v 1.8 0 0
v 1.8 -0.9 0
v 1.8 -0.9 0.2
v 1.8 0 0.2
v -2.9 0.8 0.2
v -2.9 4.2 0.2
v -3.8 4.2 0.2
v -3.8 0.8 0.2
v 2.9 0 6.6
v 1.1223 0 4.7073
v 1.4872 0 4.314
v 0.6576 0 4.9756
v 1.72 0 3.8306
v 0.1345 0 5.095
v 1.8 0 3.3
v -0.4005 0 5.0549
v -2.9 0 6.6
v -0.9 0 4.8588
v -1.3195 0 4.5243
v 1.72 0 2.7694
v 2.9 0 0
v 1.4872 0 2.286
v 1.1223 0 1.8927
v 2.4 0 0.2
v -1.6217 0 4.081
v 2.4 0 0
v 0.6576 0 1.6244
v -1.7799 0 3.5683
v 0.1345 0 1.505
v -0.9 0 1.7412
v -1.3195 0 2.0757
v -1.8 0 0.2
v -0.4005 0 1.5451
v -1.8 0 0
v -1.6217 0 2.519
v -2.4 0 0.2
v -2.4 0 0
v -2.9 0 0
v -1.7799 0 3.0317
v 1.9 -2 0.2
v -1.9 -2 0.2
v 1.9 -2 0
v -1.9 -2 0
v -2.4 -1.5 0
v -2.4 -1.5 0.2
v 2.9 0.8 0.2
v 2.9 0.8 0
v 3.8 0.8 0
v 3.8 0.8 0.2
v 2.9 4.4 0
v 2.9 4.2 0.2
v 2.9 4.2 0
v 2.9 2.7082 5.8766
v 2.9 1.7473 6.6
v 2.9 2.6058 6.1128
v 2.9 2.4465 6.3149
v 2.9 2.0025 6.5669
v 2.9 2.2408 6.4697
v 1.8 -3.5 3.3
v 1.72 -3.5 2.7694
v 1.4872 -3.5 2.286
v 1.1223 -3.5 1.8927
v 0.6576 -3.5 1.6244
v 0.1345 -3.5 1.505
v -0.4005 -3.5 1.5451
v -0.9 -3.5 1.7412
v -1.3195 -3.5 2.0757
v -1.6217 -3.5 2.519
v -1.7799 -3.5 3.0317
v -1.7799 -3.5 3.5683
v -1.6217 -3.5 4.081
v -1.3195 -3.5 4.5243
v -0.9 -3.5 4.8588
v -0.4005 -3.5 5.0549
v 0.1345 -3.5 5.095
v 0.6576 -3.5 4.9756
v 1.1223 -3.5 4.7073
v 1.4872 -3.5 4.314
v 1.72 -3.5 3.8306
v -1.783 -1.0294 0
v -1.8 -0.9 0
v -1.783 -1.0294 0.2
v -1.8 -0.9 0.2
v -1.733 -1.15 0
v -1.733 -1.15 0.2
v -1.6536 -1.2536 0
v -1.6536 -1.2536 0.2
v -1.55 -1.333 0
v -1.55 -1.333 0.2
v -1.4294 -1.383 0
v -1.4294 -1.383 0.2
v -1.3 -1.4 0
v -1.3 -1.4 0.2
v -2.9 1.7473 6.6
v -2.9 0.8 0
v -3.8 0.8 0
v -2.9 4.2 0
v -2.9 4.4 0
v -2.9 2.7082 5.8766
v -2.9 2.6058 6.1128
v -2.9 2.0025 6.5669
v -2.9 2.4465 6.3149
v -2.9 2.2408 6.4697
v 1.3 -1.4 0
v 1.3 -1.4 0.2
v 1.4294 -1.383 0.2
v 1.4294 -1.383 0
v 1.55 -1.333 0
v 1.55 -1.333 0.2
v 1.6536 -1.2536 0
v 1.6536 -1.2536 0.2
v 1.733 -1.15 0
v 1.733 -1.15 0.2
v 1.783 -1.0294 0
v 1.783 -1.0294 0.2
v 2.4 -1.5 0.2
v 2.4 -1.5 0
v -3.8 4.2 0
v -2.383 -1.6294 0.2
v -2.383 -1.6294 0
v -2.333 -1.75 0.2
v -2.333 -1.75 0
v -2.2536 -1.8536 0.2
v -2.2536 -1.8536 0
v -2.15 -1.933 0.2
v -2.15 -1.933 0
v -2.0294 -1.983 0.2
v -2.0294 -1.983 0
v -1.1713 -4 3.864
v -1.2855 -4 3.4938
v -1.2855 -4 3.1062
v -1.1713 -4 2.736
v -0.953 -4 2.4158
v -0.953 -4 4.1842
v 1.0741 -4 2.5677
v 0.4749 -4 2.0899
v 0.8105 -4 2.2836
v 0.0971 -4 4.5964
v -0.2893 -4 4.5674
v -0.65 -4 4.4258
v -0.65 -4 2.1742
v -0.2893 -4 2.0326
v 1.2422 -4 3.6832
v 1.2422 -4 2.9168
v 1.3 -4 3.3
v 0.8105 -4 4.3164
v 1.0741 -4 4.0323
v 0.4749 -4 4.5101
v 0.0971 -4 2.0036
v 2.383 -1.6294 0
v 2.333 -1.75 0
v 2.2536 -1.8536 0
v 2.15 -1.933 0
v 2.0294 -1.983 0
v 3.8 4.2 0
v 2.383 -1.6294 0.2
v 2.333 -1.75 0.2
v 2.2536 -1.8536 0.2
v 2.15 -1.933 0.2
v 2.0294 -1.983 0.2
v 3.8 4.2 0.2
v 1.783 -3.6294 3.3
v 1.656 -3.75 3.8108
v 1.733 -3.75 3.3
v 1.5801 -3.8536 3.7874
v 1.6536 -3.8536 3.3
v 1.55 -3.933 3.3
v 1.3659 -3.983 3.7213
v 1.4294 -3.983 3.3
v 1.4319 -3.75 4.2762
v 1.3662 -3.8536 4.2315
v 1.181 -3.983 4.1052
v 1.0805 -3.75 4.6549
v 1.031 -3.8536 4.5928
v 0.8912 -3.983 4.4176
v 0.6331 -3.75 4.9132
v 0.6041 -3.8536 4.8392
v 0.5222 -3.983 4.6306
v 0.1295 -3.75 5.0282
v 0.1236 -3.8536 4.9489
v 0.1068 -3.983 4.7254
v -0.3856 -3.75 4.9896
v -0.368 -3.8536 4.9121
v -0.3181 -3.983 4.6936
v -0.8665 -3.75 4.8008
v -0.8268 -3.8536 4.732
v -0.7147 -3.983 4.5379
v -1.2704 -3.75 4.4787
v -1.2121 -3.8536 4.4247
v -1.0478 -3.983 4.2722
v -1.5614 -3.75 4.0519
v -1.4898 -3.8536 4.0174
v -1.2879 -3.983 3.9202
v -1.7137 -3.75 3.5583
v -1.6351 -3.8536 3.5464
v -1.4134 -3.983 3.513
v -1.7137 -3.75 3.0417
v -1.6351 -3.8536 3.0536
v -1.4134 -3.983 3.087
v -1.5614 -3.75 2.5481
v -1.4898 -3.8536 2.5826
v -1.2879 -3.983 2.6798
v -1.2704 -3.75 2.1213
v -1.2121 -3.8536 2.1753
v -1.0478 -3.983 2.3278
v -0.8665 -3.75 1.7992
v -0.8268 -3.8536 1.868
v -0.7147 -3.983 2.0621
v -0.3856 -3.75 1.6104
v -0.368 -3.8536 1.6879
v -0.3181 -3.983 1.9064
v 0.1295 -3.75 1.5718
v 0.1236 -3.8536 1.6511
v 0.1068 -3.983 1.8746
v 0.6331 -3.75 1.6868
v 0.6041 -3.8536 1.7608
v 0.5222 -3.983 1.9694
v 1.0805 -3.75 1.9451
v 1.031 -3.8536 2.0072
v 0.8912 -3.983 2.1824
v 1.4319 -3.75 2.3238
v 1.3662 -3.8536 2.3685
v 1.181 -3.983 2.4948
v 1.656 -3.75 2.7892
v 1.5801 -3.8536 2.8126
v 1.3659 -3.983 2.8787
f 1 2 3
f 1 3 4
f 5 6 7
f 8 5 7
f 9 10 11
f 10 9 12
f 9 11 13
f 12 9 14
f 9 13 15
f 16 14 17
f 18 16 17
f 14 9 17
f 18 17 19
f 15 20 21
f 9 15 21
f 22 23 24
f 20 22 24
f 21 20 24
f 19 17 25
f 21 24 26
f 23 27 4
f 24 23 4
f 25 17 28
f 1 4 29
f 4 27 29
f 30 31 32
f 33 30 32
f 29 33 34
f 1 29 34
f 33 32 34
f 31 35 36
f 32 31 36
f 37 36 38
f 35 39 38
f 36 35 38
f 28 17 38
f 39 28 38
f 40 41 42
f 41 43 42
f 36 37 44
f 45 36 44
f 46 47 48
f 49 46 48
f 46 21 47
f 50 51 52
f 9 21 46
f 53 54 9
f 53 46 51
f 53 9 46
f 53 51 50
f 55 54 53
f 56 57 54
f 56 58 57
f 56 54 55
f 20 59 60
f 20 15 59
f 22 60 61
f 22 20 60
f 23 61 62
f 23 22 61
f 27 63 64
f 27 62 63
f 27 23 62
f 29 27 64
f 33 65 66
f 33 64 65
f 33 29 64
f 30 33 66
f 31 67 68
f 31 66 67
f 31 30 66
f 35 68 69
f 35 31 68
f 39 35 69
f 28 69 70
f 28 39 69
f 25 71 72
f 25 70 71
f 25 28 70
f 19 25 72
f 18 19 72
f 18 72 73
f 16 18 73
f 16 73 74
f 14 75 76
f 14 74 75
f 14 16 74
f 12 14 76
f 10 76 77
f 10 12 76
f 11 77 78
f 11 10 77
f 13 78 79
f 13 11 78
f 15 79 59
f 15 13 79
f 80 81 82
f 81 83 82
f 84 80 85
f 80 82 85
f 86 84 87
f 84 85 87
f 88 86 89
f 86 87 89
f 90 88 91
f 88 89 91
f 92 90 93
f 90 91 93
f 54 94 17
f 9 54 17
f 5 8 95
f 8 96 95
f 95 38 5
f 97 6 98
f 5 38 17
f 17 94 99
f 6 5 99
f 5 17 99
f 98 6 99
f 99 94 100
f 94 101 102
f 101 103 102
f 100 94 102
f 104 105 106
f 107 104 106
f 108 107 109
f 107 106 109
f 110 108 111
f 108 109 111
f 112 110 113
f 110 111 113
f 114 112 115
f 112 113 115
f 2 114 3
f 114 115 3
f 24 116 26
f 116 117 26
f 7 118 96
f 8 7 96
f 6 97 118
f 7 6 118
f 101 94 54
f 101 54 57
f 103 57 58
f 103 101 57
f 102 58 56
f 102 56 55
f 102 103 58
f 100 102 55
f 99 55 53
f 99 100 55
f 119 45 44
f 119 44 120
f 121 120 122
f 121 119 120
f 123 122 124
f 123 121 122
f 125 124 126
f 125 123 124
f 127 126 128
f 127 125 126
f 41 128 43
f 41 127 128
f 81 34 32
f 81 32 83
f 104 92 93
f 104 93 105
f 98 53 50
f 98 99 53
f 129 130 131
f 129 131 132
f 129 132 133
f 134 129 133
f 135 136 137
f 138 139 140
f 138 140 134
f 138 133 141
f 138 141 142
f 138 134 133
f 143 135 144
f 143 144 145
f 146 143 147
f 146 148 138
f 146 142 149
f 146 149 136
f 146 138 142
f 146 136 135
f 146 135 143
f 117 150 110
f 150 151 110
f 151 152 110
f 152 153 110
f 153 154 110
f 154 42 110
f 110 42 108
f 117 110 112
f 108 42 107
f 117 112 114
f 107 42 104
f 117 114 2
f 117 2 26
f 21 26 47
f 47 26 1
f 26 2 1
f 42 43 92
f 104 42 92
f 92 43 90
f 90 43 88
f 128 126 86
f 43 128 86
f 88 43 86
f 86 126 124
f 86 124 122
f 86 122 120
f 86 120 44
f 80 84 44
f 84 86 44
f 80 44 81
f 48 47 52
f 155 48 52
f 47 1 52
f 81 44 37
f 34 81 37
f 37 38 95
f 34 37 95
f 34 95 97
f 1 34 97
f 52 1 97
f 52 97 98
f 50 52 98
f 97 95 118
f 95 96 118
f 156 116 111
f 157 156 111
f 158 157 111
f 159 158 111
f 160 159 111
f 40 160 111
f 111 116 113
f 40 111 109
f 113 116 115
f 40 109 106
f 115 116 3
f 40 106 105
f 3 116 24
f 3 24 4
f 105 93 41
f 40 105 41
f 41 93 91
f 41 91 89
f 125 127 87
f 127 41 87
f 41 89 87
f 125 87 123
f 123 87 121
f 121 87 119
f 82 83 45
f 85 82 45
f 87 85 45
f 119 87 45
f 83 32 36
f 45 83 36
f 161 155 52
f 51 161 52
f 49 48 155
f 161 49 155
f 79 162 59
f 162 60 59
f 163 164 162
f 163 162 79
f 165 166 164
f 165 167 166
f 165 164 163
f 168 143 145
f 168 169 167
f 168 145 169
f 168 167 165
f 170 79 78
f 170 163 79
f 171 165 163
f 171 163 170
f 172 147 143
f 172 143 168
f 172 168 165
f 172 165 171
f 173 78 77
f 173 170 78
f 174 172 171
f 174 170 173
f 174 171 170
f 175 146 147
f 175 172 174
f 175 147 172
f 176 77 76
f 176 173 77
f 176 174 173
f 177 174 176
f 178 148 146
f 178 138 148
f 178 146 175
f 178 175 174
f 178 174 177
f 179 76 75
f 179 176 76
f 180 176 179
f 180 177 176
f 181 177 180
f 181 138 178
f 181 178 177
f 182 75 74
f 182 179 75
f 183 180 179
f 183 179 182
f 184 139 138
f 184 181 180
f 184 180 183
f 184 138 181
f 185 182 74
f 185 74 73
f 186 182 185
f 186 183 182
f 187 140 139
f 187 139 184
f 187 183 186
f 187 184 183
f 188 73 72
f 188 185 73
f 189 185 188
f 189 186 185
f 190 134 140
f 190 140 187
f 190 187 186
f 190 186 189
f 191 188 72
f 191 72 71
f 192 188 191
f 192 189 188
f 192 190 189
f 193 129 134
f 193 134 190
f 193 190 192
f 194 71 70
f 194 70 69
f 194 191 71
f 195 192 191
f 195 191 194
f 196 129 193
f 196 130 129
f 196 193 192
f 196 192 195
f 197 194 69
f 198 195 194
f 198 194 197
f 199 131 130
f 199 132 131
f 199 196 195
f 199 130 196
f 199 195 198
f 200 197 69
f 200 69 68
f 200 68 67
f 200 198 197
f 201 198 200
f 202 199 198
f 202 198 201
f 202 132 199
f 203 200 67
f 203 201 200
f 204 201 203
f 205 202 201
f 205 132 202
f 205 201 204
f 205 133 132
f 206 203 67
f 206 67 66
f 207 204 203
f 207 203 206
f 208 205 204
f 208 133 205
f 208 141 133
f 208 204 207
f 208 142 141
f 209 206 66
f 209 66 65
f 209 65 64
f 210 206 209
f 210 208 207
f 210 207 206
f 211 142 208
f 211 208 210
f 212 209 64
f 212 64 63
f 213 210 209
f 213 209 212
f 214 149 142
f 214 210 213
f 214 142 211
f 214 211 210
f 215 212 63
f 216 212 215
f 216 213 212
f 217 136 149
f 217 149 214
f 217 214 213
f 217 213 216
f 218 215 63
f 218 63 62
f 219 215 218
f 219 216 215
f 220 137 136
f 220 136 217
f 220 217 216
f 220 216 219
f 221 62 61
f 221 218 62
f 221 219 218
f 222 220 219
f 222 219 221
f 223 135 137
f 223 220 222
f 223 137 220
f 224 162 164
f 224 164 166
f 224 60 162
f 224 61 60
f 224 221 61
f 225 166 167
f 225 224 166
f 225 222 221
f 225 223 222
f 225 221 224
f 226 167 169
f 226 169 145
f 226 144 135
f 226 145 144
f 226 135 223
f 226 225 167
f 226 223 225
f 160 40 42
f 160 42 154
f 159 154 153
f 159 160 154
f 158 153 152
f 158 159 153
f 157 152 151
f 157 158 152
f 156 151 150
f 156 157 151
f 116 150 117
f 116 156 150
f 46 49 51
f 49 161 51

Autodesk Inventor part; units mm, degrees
ref_plane "YZ Plane" through (0, 0, 0) normal (1, 0, 0) x (0, 1, 0)
ref_plane "XZ Plane" through (0, 0, 0) normal (0, 1, 0) x (-1, 0, 0)
ref_plane "XY Plane" through (0, 0, 0) normal (0, 0, 1) x (1, 0, 0)
sketch "Skizze2" plane through (0, 0, 0) normal (1, 0, 0) x (0, 1, 0)
  line L0 (0, 0) -> (4.4, 0)
  line L1 (2.5, 6.6) -> (0, 6.6)
  line L2 (0, 6.6) -> (0, 0)
  line L3 (2.5, 6.6) -> (4.4, 0)
  line L4 (-0.88, 0) -> (5.28, 0) projected
  line L5 (0, 7.92) -> (0, -1.32) projected
  dimension "d2" = 6.6
  dimension "d3" = 2.5
  dimension "d4" = 4.4
extrude "Extrusion1" add sketch "Skizze2" along normal mid plane 5.8
sketch "Skizze3" plane through (-2.9, 0, 0) normal (0, -1, 0) x (1, 0, 0)
  line L0 (5.8, 0) -> (0, 0) projected
  line L1 (5.8, 6.6) -> (5.8, 0) projected
  line L2 (0, 6.6) -> (5.8, 6.6) projected
  line L3 (0, 0) -> (0, 6.6) projected
  line L4 (0, 6.6) -> (0, 0) construction
  line L5 (0, 3.3) -> (5.8, 3.3) construction
  line L6 (5.8, 0) -> (5.8, 6.6) construction
  line L7 (0, 6.6) -> (5.8, 6.6) construction
  line L8 (2.9, 6.6) -> (2.9, 0) construction
  circle A0 centre (2.9, 3.3) radius 1.8
  dimension "d7" = 3.6
extrude "Extrusion2" add sketch "Skizze3" along normal blind 4 contours A0
sketch "Skizze4" plane through (2.9, 4.4, 0) normal (0, 0, -1) x (-1, 0, 0)
  line L0 (5.8, 0) -> (0, 0) projected
  line L1 (0, -4.4) -> (0, 0) projected
  line L2 (0, -4.4) -> (5.8, -4.4) projected
  line L3 (5.8, 0) -> (5.8, -4.4) projected
  line L4 (0, -4.4) -> (0, 0) projected
  line L5 (0, -3.6) -> (-0.9, -3.6)
  line L6 (-0.9, -3.6) -> (-0.9, -0.2)
  line L7 (-0.9, -0.2) -> (0, -0.2)
  line L8 (0, -0.2) -> (0, -3.6)
  line L9 (5.8, -4.4) -> (0, -4.4) projected
  line L10 (5.3, -4.4) -> (5.3, -6.4)
  line L11 (5.3, -6.4) -> (0.5, -6.4)
  line L12 (0.5, -6.4) -> (0.5, -4.4)
  line L13 (2.9, -4.4) -> (2.9, 0) construction
  line L14 (5.8, 0) -> (0, 0) construction
  line L15 (4.7, -4.4) -> (4.7, -5.8)
  line L16 (4.7, -5.8) -> (1.1, -5.8)
  line L17 (1.1, -5.8) -> (1.1, -4.4)
  line L18 (0.5, -4.4) -> (1.1, -4.4)
  line L19 (4.7, -4.4) -> (5.3, -4.4)
  line L20 (0, -4.4) -> (5.8, -4.4) projected
  line L21 (5.8, -1.9) -> (5.8, 0) projected
  line L22 (5.8, -0.2) -> (6.7, -0.2)
  line L23 (6.7, -0.2) -> (6.7, -3.6)
  line L24 (6.7, -3.6) -> (5.8, -3.6)
  line L25 (5.8, -3.6) -> (5.8, -0.2)
  dimension "d10" = 0.8
  dimension "d11" = 3.4
  dimension "d12" = 0.9
  dimension "d13" = 2
  dimension "d14" = 4.8
  dimension "d16" = 0.6
  dimension "d17" = 0.6
  dimension "d18" = 0.9
extrude "Extrusion3" add sketch "Skizze4" against normal blind 0.2 contours L22 L23 L24 L3 | L1 L5 L6 L7 | L2 L17 L16 L15 L10 L11 L12
fillet "Rundung1" radius 1 1 edges at (0, 2.5, 6.6)
fillet "Rundung2" radius 0.5 1 edges at (-1.8, -4, 3.3)
fillet "Rundung3" radius 0.5 4 edges at (-2.4, -2, 0.1) (2.4, -2, 0.1) (1.8, -1.4, 0.1) (-1.8, -1.4, 0.1)
equation "\"d17\" = d16"
equation "\"d18\" = d12"
properties part number "KT11P4" material "PC/ABS-Kunststoff"
